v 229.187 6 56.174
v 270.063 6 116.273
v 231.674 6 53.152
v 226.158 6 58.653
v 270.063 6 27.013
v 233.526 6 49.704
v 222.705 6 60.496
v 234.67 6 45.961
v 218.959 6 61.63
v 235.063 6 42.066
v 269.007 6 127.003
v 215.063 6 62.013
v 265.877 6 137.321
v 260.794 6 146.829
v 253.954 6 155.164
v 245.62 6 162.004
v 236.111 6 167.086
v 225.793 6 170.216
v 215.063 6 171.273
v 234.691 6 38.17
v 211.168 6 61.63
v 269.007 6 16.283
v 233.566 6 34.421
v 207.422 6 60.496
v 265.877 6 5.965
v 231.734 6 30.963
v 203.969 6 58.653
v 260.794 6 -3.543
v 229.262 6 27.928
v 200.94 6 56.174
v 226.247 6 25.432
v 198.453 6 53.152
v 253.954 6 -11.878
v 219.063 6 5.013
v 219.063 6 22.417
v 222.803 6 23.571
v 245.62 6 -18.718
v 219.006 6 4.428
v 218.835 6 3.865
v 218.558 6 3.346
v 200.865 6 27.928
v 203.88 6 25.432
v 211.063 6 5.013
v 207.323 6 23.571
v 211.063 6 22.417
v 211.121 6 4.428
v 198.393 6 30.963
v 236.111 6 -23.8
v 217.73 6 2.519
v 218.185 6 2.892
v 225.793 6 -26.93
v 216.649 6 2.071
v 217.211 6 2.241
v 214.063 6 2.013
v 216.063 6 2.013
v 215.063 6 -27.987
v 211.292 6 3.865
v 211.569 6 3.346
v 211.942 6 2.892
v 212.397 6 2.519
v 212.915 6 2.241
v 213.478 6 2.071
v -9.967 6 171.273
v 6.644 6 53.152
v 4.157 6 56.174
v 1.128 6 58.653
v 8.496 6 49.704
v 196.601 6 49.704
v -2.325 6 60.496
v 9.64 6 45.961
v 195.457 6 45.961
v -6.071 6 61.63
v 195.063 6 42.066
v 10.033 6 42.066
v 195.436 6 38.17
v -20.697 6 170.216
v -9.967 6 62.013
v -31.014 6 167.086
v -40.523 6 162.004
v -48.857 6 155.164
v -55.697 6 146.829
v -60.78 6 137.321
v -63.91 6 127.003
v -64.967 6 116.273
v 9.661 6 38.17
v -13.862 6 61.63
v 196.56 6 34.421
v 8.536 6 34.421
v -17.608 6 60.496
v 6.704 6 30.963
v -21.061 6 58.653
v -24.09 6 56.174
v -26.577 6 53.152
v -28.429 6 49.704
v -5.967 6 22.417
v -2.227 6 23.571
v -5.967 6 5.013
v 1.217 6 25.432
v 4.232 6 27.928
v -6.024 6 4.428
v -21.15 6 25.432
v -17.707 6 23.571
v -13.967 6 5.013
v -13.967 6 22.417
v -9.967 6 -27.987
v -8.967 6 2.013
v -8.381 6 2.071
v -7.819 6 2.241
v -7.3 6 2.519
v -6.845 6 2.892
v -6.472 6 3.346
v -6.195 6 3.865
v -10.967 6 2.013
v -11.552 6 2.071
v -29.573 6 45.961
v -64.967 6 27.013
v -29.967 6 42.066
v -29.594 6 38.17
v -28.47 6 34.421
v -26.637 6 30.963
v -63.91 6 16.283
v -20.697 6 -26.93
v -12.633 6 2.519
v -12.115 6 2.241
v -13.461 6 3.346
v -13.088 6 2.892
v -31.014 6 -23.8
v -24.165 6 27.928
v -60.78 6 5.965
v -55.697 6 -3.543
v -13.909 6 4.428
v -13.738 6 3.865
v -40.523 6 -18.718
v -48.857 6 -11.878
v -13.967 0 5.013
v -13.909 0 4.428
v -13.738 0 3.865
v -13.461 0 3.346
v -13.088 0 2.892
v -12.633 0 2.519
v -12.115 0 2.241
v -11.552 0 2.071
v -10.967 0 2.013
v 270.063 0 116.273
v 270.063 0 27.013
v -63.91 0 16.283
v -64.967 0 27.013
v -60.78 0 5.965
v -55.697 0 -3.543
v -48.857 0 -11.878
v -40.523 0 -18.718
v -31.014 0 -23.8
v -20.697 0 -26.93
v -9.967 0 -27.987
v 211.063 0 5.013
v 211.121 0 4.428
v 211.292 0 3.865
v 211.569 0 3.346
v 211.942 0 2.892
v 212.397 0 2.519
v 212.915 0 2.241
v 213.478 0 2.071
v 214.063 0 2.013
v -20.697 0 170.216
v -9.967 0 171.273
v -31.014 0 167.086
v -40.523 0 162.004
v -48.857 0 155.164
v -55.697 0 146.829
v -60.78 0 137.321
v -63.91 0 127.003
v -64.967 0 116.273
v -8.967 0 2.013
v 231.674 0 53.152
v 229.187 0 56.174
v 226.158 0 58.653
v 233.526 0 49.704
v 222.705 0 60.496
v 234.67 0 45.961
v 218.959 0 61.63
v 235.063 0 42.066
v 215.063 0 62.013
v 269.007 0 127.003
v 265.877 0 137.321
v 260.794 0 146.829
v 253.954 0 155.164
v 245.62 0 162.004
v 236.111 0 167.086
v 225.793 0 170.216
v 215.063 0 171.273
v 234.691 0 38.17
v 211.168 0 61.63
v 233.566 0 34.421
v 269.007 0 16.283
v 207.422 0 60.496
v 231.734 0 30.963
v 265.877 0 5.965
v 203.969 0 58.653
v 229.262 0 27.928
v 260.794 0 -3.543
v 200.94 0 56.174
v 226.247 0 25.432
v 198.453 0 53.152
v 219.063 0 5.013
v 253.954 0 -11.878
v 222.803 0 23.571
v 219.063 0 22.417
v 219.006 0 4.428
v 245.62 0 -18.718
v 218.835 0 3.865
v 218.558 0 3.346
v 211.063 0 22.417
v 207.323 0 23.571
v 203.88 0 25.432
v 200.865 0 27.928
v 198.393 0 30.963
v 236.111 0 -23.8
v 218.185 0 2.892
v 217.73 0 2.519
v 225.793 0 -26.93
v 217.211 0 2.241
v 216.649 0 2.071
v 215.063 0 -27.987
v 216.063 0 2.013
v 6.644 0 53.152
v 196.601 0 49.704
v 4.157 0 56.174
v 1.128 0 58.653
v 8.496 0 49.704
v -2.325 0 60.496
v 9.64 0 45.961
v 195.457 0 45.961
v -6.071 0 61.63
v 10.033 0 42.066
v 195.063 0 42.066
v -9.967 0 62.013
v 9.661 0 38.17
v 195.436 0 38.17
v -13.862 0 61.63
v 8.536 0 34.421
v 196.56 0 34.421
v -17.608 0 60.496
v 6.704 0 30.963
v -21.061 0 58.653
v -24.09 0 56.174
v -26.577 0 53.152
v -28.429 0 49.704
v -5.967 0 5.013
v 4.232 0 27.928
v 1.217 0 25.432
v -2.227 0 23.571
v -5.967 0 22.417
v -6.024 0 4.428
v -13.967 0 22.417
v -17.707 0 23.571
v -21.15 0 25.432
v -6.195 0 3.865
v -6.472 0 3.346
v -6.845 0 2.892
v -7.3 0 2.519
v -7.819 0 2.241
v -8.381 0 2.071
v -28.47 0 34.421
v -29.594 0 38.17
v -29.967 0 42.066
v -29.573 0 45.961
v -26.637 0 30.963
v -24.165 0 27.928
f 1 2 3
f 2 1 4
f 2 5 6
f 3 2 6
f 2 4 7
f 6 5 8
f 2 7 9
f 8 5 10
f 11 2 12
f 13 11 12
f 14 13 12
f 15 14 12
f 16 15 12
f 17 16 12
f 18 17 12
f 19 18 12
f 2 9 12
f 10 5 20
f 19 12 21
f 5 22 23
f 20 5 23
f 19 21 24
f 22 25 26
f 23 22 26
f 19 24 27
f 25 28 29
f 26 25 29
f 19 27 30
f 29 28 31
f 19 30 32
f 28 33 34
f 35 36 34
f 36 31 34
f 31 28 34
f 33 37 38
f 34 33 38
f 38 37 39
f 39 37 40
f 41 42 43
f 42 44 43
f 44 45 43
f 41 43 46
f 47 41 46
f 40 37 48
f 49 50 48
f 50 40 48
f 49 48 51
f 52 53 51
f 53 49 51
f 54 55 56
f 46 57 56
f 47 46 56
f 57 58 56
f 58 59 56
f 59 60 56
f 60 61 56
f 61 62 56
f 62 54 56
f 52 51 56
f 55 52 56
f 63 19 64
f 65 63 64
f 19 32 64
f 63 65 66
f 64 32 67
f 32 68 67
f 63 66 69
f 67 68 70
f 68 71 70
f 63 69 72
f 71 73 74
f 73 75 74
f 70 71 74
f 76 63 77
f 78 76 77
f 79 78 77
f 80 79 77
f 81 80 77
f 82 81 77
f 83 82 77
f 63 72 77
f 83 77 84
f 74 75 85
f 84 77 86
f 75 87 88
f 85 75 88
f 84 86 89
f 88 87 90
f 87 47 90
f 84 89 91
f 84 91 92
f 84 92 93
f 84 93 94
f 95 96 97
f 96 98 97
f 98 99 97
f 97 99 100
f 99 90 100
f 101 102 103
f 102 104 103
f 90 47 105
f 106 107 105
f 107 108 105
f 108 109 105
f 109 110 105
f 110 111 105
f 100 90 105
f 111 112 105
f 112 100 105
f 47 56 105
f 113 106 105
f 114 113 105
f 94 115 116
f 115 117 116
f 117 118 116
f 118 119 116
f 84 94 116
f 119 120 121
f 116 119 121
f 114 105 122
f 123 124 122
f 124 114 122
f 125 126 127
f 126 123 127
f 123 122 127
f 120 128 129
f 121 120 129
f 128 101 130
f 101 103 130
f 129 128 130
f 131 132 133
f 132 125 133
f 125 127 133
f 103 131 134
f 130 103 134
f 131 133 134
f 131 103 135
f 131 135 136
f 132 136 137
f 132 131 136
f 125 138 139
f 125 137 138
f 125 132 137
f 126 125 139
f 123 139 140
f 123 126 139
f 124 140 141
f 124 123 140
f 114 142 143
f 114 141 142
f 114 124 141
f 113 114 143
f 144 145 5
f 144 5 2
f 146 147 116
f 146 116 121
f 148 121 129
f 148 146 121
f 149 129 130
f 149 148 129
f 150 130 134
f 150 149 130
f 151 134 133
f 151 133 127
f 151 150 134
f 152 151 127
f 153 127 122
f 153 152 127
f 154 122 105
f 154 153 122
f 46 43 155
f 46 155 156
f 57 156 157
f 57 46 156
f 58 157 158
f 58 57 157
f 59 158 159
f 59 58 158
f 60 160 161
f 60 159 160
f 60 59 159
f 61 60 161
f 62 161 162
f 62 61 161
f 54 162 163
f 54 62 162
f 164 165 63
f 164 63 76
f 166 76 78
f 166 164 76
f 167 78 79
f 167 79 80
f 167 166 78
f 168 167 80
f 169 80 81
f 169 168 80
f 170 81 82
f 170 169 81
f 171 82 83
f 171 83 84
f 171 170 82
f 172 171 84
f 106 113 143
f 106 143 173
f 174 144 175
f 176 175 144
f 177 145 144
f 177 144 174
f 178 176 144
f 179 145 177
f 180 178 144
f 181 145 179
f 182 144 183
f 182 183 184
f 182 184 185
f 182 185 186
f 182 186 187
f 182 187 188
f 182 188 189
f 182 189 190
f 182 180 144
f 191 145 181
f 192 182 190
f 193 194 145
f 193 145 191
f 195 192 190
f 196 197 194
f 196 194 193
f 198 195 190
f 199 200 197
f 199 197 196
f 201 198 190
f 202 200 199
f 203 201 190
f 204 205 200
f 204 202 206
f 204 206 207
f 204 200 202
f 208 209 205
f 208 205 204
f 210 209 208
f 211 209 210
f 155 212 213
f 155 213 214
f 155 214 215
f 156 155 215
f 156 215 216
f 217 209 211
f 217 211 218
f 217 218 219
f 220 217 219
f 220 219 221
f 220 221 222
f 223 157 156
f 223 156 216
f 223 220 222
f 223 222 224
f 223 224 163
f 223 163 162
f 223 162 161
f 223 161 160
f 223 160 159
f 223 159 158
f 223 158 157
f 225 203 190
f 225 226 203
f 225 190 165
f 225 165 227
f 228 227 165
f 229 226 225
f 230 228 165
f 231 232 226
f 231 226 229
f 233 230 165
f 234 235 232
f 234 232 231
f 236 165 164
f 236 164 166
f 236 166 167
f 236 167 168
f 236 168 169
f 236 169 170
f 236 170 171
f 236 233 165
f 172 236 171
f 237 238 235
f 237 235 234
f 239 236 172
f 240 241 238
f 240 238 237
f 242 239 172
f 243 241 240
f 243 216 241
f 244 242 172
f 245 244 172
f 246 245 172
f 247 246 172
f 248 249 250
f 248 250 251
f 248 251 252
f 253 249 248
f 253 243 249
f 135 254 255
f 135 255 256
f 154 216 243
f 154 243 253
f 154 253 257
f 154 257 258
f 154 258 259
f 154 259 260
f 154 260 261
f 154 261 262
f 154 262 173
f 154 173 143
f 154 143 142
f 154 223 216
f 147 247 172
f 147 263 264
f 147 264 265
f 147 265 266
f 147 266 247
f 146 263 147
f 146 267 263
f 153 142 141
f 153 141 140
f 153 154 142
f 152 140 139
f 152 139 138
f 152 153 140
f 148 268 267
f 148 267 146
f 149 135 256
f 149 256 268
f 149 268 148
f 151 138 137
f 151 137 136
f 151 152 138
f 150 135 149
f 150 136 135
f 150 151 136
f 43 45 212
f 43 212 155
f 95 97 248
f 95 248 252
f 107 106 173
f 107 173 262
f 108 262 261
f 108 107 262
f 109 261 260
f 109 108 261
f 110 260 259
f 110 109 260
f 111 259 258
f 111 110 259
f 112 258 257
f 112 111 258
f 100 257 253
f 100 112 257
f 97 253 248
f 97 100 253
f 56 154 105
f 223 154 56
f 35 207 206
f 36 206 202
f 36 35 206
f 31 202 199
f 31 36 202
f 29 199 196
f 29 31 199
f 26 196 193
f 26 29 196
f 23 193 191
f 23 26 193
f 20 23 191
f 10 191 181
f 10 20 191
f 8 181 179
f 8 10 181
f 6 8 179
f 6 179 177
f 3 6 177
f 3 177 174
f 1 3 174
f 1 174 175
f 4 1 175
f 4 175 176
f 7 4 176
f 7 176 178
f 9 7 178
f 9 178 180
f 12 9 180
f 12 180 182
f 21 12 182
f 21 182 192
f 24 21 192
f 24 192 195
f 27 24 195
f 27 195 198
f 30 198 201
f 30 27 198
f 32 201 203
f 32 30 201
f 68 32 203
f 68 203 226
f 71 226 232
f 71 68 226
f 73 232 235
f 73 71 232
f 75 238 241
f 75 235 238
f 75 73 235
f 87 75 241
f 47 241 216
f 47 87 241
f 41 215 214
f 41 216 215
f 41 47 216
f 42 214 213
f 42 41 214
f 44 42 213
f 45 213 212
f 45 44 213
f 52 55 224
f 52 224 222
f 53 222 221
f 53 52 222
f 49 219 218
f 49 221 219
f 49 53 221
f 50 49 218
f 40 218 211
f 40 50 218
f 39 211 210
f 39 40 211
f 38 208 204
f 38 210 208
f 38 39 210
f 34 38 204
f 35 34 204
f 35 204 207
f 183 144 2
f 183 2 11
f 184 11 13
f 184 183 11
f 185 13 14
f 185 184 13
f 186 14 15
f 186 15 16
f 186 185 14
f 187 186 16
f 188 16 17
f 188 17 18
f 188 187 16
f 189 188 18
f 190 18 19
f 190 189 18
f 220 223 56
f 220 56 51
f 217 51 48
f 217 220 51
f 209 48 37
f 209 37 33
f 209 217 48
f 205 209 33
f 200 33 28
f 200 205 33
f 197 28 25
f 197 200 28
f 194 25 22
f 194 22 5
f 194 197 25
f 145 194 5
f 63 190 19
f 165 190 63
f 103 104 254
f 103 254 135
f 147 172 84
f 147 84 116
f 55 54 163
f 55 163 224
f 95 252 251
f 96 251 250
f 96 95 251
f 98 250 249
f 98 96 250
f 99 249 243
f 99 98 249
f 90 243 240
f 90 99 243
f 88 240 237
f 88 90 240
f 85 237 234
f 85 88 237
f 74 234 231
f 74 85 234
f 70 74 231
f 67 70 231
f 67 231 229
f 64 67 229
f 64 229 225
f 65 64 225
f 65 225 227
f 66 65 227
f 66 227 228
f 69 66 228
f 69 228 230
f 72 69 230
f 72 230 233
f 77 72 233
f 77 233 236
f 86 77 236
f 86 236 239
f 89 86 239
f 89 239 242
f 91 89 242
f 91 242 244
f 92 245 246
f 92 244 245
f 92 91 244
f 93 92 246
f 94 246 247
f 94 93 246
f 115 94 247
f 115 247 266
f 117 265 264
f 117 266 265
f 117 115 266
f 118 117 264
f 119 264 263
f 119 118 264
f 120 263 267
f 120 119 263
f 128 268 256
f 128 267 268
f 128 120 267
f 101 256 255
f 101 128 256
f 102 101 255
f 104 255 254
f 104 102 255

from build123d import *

# Parameters (mm, degrees)
BOSS_EXTRUDE1_DEPTH = 6
CUT_EXTRUDE2_DEPTH  = 280


with BuildPart() as part:
    # Sketch1 → Boss-Extrude1 (new body)
    with BuildSketch(Plane(origin=(0, 0, 0), x_dir=(1, 0, 0), z_dir=(0, 1, 0))):
        with BuildLine():
            Line((-9.966577693, 27.987014401), (215.063422307, 27.987014401))
            ThreePointArc((215.063422307, 27.987014401), (253.954295273, 11.877887367), (270.063422307, -27.012985599))
            Line((270.063422307, -27.012985599), (270.063422307, -116.272985599))
            ThreePointArc((270.063422307, -116.272985599), (253.954295273, -155.163858564), (215.063422307, -171.272985599))
            Line((215.063422307, -171.272985599), (-9.966577693, -171.272985599))
            ThreePointArc((-9.966577693, -171.272985599), (-48.857450658, -155.163858564), (-64.966577693, -116.272985599))
            Line((-64.966577693, -116.272985599), (-64.966577693, -27.012985599))
            ThreePointArc((-64.966577693, -27.012985599), (-48.857450658, 11.877887367), (-9.966577693, 27.987014401))
        make_face()
    extrude(amount=BOSS_EXTRUDE1_DEPTH)

    # Sketch3 → Cut-Extrude2 (cut)
    with BuildSketch(Plane(origin=(0, 6, 0), x_dir=(1, 0, 0), z_dir=(0, 1, 0))):
        with BuildLine():
            Line((-10.966577693, -2.012985599), (-8.966577693, -2.012985599))
            ThreePointArc((-8.966577693, -2.012985599), (-6.845257349, -2.891665255), (-5.966577693, -5.012985599))
            Line((-5.966577693, -5.012985599), (-5.966577693, -22.417067656))
            ThreePointArc((-5.966577693, -22.417067656), (-9.966577693, -62.012985599), (-13.966577693, -22.417067656))
            Line((-13.966577693, -22.417067656), (-13.966577693, -5.012985599))
            ThreePointArc((-13.966577693, -5.012985599), (-13.087898036, -2.891665255), (-10.966577693, -2.012985599))
        make_face()
        with BuildLine():
            Line((214.063422307, -2.012985599), (216.063422307, -2.012985599))
            ThreePointArc((216.063422307, -2.012985599), (218.184742651, -2.891665255), (219.063422307, -5.012985599))
            Line((219.063422307, -5.012985599), (219.063422307, -22.417067656))
            ThreePointArc((219.063422307, -22.417067656), (215.063422307, -62.012985599), (211.063422307, -22.417067656))
            Line((211.063422307, -22.417067656), (211.063422307, -5.012985599))
            ThreePointArc((211.063422307, -5.012985599), (211.942101964, -2.891665255), (214.063422307, -2.012985599))
        make_face()
    extrude(amount=-CUT_EXTRUDE2_DEPTH, mode=Mode.SUBTRACT)


solid = part.part
